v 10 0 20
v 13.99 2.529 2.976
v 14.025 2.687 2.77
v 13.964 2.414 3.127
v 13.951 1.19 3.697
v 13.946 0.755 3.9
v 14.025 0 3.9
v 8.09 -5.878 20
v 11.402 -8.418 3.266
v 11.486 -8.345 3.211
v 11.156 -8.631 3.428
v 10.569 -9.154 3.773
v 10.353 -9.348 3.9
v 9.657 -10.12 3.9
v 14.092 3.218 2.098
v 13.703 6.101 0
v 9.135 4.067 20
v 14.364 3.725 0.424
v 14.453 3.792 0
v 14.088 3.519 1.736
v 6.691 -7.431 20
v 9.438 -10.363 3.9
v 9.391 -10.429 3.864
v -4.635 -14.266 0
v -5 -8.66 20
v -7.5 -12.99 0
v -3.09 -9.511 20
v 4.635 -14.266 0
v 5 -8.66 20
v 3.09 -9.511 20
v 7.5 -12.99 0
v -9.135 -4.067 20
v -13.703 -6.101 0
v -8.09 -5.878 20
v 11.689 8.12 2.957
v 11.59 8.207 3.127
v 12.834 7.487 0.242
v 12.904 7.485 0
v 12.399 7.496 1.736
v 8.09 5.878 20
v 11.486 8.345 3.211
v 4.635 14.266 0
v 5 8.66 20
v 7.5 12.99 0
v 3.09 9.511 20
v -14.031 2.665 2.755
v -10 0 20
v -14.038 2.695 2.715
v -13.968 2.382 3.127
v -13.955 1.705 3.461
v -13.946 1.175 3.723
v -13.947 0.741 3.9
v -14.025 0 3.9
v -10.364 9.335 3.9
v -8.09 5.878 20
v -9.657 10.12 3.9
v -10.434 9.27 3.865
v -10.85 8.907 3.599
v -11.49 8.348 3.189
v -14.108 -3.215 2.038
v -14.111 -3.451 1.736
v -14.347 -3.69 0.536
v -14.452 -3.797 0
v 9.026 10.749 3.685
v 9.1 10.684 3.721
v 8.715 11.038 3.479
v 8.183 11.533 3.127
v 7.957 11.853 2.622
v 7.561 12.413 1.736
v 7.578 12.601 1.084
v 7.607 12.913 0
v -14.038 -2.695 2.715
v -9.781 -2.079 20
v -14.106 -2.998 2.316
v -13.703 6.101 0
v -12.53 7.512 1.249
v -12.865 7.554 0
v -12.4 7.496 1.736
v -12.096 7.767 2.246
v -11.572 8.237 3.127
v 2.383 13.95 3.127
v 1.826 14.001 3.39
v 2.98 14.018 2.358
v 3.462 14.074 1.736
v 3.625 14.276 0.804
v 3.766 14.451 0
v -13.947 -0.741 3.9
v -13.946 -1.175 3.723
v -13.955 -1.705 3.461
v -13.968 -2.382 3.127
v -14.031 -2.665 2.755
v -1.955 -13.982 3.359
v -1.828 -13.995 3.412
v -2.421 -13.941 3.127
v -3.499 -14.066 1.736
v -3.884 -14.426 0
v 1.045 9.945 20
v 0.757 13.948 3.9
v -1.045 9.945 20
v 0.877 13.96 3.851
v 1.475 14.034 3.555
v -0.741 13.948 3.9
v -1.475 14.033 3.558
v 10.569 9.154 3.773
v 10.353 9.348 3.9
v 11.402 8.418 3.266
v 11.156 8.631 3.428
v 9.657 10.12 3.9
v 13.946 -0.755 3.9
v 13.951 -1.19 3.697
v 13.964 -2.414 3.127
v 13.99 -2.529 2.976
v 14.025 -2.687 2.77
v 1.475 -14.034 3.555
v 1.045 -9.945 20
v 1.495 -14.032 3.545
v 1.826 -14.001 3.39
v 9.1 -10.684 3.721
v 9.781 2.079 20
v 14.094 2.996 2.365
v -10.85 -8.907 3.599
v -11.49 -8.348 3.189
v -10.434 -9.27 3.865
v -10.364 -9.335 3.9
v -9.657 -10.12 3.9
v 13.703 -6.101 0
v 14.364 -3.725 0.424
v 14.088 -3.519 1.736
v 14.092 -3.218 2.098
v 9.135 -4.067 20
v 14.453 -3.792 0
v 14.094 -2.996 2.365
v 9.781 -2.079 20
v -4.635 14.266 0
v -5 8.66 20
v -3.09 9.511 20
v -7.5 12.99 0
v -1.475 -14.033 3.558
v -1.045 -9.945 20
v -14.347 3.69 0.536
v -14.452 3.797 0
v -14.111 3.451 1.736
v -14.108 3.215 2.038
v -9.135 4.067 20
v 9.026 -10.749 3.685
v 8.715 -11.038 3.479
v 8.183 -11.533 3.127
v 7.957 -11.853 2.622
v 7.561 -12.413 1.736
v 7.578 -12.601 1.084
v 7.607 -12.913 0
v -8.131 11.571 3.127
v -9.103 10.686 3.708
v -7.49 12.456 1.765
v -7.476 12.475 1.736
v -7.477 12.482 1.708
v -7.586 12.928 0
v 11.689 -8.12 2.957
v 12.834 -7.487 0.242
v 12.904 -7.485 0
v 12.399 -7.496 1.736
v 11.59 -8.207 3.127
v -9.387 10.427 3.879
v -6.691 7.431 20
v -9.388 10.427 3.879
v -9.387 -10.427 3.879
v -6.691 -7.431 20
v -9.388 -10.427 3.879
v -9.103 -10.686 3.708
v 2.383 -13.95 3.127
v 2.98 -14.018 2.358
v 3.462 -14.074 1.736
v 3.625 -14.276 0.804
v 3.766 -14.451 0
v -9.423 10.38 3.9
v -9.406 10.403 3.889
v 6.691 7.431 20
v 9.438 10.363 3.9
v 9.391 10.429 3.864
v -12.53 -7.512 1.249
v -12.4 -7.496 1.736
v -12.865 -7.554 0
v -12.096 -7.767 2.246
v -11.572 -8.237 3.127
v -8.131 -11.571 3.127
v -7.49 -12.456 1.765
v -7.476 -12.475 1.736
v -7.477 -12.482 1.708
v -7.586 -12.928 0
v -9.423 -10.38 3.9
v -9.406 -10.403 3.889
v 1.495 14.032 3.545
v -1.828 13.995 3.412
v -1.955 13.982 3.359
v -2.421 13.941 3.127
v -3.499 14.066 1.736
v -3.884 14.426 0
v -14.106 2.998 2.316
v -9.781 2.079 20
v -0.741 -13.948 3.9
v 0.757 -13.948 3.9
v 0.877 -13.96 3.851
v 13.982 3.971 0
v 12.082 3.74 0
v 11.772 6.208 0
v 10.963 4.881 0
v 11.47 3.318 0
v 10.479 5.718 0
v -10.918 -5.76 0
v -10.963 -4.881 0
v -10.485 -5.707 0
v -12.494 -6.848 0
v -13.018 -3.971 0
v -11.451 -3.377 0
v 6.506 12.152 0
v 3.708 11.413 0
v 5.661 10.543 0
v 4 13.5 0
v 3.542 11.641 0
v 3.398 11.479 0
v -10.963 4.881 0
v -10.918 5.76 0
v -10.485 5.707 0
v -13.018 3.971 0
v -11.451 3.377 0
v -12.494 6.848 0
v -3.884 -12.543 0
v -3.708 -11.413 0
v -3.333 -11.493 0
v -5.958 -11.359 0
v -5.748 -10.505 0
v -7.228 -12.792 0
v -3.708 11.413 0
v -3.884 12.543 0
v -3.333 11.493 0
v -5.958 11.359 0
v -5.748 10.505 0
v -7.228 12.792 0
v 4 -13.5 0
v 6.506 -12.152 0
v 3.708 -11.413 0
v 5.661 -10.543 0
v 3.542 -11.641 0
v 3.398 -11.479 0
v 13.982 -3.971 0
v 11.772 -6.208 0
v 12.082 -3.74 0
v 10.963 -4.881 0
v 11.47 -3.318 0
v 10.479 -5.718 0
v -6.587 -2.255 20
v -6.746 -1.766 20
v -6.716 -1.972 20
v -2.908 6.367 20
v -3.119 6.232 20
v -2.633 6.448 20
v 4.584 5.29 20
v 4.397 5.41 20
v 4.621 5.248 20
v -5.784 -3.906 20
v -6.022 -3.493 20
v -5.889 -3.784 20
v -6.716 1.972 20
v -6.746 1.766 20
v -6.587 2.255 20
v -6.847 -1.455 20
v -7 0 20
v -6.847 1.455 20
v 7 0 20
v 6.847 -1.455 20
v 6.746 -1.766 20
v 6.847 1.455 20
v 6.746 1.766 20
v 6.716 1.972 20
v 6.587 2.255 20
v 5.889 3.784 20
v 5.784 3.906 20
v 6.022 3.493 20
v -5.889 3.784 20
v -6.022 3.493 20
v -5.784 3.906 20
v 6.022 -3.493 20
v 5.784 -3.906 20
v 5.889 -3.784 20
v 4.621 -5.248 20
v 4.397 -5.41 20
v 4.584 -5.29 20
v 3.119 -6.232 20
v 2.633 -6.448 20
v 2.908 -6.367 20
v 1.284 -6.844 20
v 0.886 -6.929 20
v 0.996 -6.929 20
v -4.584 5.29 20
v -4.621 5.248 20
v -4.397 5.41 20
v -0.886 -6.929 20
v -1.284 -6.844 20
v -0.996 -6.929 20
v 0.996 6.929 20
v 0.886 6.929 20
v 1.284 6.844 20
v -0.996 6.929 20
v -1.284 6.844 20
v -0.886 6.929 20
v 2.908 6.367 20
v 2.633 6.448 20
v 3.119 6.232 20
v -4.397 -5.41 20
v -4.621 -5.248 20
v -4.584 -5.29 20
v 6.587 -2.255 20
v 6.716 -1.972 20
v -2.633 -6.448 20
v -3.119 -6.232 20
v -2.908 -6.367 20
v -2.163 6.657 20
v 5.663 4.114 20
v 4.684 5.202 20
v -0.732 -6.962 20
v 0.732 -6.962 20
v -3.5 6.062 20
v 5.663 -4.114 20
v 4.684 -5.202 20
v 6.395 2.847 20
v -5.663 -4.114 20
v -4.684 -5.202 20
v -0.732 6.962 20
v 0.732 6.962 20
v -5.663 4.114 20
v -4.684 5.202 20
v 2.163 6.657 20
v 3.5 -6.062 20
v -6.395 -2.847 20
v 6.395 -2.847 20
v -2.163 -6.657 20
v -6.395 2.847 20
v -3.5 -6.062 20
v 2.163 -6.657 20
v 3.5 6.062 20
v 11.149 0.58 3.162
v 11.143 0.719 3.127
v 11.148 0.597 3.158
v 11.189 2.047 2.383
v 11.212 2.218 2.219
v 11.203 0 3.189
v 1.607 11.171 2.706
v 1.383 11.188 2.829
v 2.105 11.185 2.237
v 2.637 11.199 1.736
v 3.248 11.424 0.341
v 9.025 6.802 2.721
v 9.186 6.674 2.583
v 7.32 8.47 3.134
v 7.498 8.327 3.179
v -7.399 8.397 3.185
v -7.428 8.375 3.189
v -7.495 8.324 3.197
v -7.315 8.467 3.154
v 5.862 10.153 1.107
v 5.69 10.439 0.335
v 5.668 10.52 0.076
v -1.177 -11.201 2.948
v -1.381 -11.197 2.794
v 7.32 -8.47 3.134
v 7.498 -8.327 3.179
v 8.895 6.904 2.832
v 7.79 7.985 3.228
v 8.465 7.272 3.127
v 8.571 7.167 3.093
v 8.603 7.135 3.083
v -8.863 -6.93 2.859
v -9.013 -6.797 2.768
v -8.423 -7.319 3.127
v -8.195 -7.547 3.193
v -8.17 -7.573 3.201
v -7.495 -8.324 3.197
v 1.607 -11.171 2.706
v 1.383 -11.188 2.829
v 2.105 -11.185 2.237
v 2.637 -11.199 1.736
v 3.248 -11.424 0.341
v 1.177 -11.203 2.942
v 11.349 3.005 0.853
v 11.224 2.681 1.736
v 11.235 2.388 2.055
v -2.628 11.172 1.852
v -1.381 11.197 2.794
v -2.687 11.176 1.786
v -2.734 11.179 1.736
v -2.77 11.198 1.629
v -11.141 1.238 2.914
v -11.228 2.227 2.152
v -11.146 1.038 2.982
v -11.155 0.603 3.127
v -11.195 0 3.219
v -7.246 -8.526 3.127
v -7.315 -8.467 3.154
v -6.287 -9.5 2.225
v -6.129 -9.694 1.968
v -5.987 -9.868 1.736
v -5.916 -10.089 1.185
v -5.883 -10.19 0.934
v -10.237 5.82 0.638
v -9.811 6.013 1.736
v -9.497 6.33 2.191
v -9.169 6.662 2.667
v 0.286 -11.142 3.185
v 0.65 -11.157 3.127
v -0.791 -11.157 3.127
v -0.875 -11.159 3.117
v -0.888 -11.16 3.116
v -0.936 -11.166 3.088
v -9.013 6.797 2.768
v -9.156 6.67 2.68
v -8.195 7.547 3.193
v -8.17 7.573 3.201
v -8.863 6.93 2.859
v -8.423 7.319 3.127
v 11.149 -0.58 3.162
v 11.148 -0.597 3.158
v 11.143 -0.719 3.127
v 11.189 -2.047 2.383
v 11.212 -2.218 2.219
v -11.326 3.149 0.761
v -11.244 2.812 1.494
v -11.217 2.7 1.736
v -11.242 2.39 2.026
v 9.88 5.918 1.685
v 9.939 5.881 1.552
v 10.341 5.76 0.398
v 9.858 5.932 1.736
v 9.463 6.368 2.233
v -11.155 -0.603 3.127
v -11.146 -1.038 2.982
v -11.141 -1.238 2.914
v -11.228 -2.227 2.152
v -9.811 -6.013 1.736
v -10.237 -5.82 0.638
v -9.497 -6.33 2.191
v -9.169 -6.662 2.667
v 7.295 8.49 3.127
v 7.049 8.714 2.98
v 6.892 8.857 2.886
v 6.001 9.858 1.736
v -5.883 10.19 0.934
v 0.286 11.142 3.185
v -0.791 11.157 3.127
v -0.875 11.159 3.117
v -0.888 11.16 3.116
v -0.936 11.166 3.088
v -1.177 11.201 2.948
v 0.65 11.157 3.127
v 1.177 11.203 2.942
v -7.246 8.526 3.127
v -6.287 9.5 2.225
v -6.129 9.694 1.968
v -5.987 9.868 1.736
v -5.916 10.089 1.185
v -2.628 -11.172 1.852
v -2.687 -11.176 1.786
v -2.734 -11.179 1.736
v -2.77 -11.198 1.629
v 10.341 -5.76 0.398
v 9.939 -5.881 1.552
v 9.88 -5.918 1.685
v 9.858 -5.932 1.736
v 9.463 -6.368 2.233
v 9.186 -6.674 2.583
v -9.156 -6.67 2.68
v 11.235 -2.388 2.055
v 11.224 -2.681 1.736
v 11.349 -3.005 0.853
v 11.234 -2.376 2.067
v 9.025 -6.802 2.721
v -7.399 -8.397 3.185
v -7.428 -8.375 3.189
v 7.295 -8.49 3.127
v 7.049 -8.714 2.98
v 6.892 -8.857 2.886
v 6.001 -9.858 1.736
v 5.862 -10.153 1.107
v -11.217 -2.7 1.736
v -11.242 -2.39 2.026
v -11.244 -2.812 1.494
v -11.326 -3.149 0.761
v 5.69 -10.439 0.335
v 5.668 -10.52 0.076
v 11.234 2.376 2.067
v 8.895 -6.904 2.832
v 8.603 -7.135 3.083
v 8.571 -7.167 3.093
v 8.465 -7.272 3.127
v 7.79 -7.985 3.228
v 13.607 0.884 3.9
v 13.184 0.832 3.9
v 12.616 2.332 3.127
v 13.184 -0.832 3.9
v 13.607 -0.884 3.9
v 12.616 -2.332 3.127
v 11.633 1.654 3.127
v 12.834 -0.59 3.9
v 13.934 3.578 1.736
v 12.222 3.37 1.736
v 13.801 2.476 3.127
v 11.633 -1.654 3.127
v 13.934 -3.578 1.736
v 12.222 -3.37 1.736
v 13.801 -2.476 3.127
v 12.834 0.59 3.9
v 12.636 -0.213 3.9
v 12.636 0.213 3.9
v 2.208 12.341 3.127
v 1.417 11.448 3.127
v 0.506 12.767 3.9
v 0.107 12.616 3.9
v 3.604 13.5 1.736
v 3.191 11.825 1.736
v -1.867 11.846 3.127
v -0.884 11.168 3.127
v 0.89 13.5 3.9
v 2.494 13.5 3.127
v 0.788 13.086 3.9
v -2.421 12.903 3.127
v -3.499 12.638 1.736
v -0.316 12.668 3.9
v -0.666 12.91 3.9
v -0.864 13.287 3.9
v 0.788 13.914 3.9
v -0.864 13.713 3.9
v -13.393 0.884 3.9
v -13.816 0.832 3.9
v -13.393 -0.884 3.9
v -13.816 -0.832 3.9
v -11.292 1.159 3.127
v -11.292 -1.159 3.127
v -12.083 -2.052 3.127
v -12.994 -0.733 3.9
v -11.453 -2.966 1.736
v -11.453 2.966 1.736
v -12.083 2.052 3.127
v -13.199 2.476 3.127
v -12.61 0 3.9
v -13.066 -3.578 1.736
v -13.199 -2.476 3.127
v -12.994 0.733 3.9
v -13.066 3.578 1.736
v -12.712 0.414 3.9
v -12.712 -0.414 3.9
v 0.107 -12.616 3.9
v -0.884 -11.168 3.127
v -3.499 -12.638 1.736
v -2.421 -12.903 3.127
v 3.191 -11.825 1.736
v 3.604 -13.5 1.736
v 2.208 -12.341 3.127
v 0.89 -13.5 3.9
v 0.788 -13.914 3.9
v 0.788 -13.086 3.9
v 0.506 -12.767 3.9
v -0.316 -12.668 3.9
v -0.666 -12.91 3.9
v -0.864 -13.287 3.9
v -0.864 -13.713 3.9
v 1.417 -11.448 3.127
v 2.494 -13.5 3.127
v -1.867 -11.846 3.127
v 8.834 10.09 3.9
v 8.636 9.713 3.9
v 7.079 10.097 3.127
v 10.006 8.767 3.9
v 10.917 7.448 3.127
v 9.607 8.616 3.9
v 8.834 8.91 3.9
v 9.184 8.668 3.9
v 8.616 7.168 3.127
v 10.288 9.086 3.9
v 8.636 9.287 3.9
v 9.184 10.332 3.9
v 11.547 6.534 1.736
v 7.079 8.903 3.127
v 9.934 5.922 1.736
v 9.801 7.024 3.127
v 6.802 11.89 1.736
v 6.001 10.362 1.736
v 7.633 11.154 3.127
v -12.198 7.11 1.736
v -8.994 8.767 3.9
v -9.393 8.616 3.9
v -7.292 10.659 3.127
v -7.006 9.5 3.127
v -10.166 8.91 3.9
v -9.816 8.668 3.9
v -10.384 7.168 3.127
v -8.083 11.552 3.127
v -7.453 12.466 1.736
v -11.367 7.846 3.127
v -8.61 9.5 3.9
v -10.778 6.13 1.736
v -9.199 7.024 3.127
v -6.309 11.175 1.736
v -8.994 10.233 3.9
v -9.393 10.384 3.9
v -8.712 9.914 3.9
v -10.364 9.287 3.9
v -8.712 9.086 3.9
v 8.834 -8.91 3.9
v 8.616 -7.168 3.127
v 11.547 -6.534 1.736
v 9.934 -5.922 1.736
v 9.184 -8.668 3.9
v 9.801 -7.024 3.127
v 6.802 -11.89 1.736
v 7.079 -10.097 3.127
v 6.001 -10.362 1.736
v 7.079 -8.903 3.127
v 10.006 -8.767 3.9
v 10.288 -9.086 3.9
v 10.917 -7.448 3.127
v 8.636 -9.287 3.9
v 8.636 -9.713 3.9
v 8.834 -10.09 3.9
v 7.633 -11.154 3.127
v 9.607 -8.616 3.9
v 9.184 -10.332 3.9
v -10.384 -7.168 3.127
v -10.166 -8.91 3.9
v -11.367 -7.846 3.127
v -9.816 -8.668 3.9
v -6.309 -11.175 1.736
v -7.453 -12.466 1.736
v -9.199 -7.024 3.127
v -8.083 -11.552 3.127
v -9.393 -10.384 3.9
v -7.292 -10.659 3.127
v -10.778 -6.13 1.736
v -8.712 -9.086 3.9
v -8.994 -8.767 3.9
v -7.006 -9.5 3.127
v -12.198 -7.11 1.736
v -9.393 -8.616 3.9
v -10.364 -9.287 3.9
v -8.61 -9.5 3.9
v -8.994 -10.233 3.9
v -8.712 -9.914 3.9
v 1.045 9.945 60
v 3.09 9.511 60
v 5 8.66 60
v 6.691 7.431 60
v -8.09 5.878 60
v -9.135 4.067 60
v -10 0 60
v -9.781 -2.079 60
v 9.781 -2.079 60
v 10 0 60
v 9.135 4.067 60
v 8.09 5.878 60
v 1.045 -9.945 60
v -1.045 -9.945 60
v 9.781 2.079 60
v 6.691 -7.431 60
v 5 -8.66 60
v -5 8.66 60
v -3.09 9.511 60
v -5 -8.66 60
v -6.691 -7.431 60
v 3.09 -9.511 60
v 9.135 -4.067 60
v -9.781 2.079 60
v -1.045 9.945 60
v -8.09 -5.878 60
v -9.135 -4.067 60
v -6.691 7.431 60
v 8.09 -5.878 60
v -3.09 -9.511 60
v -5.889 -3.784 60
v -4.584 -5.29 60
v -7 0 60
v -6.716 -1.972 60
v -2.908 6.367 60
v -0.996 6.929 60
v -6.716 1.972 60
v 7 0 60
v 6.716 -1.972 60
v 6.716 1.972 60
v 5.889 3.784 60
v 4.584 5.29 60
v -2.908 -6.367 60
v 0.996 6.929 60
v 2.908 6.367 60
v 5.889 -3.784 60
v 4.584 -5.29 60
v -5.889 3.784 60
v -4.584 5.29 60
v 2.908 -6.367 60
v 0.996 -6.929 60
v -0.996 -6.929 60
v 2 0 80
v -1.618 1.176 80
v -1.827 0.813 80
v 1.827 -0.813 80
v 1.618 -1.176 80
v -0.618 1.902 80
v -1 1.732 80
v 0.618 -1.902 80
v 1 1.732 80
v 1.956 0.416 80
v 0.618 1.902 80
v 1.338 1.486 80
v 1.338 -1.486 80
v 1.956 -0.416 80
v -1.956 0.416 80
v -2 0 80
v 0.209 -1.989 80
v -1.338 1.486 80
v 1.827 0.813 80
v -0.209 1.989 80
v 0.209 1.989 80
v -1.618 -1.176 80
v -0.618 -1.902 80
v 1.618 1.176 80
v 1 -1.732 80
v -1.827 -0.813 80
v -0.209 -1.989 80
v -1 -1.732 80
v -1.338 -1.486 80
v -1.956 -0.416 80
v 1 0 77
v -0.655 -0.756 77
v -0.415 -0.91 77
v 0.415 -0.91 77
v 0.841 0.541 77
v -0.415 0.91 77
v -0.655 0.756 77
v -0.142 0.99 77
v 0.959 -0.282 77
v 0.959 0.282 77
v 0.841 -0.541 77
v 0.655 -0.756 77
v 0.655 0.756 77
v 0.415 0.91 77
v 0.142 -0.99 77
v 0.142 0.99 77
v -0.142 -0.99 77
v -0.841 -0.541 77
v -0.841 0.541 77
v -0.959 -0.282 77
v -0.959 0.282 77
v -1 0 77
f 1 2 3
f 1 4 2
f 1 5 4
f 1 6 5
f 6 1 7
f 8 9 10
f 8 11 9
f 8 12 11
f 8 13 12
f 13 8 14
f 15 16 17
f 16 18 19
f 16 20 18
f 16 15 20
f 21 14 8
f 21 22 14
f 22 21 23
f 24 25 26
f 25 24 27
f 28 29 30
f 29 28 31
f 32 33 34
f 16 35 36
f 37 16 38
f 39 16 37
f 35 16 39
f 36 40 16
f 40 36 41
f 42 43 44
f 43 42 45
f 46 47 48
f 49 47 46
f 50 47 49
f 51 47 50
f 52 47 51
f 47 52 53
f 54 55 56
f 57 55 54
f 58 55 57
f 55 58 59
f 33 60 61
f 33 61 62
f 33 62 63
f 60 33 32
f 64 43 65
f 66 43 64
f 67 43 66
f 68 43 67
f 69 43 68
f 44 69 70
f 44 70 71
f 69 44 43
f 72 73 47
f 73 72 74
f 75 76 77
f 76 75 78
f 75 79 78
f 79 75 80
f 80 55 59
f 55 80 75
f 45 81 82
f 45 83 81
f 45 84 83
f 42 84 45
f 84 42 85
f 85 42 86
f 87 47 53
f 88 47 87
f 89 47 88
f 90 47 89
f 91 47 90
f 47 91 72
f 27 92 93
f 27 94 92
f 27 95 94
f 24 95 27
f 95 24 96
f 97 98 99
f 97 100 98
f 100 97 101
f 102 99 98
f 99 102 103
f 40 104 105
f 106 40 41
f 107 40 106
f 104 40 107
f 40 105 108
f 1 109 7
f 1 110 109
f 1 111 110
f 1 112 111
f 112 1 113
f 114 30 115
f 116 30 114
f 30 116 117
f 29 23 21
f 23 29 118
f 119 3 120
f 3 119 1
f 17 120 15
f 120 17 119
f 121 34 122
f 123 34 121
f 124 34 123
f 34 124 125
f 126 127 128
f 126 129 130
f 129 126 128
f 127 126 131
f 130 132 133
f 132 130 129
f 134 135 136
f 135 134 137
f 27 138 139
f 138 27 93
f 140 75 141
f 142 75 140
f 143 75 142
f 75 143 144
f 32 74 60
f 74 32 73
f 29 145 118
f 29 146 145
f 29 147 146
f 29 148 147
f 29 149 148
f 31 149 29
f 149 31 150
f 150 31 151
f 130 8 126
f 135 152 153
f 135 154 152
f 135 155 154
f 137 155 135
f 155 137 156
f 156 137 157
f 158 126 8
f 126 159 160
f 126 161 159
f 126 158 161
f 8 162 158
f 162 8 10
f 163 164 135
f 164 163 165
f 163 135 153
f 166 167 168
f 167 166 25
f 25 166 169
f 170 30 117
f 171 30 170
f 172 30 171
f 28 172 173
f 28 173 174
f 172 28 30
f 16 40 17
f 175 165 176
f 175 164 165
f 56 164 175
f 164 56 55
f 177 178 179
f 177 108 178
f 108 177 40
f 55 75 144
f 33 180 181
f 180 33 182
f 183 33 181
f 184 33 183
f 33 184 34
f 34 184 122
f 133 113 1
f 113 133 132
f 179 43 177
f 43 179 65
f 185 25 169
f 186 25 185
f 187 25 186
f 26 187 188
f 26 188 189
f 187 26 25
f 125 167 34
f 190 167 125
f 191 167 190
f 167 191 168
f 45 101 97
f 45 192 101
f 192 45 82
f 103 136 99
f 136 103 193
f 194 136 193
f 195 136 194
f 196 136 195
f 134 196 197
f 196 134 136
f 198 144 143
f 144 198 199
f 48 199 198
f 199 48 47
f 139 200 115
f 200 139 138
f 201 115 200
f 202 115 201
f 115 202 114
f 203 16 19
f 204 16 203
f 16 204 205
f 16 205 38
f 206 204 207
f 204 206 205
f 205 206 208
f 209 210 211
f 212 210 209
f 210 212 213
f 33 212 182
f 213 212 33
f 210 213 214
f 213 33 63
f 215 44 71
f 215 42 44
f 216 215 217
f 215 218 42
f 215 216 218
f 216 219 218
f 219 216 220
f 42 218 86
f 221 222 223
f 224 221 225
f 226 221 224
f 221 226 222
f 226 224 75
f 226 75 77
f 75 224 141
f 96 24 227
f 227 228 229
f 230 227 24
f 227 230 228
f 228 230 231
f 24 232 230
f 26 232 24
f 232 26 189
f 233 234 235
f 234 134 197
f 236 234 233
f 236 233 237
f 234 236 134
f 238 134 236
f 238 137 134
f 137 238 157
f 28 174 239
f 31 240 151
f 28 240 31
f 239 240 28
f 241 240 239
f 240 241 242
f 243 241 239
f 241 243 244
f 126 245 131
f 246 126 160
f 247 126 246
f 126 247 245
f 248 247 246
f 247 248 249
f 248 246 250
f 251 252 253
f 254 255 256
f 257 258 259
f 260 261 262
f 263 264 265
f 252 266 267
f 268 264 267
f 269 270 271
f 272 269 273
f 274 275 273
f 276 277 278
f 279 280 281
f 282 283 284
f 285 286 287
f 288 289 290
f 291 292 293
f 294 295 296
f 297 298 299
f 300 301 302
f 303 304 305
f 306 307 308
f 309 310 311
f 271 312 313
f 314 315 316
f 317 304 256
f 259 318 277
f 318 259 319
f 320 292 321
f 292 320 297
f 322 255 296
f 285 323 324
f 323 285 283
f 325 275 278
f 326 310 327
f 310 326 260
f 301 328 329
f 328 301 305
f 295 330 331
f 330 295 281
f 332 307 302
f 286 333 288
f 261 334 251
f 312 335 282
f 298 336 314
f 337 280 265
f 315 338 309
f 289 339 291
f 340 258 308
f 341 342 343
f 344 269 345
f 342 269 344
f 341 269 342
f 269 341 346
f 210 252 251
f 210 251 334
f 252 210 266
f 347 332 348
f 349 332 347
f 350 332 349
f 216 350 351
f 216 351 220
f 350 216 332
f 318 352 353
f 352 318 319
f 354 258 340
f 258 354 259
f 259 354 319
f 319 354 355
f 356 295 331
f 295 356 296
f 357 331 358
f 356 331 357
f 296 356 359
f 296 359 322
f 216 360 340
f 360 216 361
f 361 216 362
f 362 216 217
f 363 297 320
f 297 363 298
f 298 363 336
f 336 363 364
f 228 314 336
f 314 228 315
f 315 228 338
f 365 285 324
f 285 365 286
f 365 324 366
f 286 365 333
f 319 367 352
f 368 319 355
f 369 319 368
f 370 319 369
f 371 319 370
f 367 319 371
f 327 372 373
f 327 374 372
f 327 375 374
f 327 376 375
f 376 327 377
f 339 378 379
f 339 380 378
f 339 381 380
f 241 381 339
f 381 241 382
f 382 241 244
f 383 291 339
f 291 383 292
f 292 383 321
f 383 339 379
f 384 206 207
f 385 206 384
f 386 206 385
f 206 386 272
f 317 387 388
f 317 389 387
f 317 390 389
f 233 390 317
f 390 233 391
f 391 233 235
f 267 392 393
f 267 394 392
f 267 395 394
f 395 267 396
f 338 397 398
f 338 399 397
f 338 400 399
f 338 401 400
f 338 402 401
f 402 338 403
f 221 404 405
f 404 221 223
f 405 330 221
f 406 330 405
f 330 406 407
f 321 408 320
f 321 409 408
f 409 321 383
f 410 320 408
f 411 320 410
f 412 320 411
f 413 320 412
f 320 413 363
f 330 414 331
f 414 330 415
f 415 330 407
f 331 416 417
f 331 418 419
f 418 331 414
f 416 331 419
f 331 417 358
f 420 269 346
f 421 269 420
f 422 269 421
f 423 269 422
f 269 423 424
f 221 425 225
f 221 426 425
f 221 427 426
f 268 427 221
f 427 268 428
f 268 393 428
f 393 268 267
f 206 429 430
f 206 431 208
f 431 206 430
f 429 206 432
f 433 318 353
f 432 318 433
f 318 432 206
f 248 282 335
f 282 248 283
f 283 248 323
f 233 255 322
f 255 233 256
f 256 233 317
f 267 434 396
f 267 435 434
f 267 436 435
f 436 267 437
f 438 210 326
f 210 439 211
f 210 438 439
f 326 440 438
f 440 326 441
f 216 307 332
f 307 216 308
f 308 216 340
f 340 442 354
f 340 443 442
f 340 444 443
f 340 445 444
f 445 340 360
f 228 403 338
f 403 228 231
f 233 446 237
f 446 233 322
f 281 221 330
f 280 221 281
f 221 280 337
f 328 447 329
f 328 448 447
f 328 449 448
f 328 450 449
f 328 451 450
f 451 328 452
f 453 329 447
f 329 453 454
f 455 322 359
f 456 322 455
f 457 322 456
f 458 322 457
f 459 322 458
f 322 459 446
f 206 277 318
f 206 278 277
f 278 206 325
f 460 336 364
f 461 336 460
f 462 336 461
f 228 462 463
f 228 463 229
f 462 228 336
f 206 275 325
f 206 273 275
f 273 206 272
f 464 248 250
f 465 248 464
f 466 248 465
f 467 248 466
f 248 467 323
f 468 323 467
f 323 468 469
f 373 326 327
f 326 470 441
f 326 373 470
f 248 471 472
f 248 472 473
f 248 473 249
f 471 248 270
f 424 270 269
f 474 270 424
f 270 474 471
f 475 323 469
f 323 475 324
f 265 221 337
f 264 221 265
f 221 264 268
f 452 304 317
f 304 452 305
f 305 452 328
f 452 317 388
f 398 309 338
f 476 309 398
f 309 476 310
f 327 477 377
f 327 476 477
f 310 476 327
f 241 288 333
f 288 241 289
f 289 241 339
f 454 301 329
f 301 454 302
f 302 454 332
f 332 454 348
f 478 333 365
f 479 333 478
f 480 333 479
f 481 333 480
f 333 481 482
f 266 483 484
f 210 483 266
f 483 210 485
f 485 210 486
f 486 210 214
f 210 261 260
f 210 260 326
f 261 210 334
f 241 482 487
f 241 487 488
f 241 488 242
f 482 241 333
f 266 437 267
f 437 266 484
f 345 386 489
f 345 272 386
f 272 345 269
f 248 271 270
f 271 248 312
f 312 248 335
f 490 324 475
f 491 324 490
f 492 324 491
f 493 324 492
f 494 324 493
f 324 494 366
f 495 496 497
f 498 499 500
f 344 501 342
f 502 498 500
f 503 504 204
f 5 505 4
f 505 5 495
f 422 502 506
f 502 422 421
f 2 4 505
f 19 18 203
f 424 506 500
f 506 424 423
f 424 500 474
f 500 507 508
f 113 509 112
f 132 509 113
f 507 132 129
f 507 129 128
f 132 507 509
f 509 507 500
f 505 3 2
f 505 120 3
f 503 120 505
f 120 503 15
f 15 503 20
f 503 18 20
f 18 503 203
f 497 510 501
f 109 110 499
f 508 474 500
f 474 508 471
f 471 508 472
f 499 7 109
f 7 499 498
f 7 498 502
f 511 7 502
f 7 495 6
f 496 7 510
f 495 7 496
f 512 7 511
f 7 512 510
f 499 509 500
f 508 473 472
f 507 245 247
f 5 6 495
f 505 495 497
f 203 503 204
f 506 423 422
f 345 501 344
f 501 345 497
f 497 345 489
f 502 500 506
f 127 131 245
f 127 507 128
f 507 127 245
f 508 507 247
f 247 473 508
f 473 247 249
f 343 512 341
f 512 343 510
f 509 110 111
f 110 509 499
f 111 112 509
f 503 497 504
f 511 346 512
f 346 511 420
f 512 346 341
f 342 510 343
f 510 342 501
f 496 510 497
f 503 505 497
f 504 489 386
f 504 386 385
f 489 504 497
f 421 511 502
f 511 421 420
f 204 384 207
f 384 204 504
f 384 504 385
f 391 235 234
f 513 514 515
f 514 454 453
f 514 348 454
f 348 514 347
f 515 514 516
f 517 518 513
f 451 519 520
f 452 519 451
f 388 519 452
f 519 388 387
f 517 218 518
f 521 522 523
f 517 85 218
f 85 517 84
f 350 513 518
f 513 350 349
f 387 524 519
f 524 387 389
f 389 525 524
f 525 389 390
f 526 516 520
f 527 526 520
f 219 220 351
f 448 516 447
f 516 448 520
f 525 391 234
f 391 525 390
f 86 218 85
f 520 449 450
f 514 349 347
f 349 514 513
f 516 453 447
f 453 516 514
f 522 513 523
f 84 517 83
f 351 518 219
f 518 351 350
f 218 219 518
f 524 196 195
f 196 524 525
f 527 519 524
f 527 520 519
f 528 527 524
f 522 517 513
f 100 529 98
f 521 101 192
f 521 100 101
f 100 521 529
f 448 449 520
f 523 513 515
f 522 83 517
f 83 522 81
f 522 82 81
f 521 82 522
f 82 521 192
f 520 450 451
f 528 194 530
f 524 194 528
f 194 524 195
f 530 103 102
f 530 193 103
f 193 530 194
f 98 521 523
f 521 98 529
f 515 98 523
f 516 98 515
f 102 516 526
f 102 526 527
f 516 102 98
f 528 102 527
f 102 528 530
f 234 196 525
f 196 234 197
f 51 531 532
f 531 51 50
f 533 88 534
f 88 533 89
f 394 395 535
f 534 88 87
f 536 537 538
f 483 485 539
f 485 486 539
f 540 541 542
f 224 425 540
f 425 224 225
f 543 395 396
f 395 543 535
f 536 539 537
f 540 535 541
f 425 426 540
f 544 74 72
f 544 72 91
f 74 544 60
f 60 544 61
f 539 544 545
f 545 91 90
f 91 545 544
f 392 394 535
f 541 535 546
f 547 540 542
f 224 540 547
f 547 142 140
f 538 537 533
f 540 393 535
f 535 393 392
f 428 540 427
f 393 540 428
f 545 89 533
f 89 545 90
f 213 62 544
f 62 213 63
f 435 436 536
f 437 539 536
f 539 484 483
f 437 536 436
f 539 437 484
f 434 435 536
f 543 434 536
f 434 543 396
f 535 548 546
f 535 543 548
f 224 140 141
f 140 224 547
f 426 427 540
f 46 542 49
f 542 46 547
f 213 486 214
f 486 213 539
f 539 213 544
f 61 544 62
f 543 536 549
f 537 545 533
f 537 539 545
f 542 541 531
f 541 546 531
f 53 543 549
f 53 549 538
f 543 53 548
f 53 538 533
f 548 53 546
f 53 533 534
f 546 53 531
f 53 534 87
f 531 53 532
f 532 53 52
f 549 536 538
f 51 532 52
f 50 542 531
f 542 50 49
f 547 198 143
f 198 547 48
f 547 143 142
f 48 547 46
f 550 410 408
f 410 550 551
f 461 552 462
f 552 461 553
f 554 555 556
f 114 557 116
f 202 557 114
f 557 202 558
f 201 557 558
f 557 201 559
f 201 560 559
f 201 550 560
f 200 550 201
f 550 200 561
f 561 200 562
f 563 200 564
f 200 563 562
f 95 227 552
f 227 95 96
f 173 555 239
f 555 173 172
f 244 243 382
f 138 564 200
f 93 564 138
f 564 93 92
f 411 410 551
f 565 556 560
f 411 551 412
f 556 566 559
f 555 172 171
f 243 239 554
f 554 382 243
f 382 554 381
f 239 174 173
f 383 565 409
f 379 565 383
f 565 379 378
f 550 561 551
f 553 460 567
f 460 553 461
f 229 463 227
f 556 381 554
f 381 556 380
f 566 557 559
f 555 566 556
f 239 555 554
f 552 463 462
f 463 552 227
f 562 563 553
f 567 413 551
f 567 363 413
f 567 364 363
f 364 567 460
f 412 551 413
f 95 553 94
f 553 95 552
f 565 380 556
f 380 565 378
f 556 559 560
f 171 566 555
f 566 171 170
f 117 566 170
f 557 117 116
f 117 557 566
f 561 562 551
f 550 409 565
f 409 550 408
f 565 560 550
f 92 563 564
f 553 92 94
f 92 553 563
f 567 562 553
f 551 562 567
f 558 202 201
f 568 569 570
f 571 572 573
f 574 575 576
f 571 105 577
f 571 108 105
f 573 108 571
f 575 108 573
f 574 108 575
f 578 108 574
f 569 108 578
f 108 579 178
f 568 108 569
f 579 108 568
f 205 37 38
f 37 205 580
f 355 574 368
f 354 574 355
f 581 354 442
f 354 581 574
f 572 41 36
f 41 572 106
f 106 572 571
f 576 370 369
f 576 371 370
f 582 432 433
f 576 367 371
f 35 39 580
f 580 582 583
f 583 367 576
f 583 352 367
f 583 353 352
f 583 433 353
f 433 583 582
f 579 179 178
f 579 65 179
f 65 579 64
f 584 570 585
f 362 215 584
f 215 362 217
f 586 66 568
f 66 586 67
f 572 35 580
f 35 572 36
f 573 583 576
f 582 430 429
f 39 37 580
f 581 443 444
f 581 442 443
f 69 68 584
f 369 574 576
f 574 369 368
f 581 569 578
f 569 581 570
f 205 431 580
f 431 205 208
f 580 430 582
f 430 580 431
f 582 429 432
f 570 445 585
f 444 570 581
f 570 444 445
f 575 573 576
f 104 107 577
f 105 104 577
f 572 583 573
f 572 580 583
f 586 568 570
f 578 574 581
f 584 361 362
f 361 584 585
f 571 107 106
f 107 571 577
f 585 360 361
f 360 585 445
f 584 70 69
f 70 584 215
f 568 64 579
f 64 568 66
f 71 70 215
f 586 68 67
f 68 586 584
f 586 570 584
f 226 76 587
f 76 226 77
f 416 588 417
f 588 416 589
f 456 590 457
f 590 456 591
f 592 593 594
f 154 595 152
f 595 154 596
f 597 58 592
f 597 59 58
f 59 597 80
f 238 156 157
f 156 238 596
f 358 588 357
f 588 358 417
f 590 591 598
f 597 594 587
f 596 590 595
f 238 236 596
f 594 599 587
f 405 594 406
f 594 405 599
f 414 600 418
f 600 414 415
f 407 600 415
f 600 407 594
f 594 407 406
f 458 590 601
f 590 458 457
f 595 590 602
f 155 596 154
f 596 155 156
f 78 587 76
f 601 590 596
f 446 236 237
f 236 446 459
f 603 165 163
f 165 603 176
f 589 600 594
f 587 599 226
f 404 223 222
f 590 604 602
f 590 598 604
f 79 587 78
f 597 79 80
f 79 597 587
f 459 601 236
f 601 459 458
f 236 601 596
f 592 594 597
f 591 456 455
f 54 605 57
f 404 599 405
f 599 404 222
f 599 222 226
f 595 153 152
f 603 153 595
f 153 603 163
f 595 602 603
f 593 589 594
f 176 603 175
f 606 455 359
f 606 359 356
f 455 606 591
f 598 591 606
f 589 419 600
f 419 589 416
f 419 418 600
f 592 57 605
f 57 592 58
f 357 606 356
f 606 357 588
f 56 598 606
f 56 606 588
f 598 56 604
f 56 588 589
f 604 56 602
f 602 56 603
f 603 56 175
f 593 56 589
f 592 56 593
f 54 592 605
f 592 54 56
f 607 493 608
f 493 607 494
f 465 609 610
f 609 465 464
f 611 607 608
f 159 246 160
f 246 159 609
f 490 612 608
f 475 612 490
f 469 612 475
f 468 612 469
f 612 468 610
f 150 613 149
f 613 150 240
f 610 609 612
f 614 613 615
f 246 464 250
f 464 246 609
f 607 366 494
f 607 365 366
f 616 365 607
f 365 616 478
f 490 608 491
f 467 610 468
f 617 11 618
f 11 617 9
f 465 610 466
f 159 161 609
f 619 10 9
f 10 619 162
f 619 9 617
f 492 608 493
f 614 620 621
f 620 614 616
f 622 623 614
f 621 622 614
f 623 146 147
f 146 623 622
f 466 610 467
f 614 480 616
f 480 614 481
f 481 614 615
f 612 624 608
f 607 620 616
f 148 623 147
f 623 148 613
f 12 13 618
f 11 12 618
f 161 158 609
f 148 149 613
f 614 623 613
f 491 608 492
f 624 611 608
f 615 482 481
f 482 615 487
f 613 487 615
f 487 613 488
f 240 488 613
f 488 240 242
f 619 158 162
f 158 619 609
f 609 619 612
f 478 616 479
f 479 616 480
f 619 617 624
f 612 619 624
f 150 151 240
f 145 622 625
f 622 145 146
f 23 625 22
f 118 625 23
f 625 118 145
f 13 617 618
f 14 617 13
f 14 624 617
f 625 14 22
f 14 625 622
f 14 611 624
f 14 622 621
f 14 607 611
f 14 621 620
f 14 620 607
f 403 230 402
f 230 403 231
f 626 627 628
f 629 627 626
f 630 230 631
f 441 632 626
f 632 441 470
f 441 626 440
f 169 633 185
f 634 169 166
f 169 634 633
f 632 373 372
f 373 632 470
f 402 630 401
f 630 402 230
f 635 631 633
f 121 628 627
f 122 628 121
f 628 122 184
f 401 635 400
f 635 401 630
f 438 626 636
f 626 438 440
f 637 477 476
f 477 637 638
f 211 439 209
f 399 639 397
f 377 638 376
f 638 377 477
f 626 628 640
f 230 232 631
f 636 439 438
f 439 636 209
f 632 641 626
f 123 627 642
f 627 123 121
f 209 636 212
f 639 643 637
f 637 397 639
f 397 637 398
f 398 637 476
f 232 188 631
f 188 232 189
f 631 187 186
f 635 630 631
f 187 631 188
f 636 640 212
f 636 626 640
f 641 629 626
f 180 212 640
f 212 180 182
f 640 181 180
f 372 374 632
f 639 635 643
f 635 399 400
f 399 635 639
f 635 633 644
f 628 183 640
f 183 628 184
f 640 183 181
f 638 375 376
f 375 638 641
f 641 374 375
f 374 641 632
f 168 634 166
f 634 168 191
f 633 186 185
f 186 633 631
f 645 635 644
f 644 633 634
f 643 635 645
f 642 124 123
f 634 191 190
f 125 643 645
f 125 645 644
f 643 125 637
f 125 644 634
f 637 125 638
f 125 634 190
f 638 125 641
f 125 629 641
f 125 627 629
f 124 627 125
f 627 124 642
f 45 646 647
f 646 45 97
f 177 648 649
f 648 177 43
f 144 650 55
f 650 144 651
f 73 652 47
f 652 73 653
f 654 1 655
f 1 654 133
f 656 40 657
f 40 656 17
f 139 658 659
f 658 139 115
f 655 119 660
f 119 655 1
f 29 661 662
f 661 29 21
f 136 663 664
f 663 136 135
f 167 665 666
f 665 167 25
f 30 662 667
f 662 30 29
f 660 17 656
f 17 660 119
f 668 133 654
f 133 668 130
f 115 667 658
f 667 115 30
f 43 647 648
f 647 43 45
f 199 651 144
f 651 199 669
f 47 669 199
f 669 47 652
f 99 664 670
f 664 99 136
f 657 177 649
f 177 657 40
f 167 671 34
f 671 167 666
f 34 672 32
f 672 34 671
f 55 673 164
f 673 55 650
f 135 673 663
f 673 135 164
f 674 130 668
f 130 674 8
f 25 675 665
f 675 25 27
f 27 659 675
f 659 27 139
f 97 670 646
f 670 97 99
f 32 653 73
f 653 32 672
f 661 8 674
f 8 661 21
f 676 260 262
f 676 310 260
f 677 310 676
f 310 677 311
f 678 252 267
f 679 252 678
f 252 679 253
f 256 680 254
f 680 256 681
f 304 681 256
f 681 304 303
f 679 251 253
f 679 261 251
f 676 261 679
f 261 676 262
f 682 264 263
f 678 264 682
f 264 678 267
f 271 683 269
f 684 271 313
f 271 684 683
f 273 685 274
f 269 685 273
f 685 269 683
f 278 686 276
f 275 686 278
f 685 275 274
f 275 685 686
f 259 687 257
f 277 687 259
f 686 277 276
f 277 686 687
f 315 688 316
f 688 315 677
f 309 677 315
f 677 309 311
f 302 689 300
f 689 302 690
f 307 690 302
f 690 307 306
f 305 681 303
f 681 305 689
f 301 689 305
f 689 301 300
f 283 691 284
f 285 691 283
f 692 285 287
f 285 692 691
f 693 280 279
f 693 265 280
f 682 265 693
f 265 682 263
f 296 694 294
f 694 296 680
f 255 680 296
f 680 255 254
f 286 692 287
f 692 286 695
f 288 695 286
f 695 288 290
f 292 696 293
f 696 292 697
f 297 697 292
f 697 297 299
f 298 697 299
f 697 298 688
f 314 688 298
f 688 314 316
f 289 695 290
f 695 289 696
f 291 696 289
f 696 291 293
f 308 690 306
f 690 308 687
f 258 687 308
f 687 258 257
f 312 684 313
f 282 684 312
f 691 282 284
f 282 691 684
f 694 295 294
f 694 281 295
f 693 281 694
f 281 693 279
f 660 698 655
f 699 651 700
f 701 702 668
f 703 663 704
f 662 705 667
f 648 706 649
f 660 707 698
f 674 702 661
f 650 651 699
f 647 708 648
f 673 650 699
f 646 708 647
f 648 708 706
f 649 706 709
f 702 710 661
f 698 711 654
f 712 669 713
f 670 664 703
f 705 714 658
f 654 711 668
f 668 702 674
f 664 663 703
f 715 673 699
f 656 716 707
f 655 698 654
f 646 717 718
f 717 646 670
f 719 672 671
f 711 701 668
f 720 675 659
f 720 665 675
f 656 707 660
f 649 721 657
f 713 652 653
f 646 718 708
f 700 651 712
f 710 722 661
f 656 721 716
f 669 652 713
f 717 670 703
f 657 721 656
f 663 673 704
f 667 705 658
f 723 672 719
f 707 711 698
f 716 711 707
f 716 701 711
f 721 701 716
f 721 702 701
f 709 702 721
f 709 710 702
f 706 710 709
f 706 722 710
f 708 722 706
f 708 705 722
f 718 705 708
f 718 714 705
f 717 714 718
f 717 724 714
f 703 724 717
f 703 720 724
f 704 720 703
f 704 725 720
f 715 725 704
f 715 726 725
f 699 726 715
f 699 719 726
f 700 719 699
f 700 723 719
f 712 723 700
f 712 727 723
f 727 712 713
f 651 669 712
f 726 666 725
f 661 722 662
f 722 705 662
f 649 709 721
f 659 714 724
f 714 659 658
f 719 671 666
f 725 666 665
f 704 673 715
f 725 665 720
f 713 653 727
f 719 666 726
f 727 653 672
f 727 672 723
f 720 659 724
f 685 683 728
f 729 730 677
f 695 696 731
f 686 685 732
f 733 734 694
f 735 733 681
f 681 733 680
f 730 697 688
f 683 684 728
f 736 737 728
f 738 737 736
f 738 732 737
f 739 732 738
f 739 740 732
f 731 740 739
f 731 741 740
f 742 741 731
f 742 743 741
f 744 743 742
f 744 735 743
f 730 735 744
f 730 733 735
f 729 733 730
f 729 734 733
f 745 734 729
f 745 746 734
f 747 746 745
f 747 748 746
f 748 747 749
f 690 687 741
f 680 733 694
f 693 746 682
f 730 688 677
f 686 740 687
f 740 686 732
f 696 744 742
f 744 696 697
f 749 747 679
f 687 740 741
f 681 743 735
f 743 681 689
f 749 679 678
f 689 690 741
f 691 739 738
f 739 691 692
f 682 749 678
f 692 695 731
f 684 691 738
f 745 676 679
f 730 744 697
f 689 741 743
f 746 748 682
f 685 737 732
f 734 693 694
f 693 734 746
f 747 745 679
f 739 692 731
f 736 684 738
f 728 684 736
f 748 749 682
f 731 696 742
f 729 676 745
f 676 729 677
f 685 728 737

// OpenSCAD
module Base() {
  difference() {
    cylinder(h=20, r1=15, r2=10);
    cylinder(h=20, r1=12, r2=7);
    translate([13.5,0,0]) sphere(r=4);
    translate([0, 13.5,0]) sphere(r=4);
    translate([-13.5,0,0]) sphere(r=4);
    translate([0, -13.5,0]) sphere(r=4);
    translate([9.5, 9.5,0]) sphere(r=4);
    translate([-9.5, 9.5,0]) sphere(r=4);
    translate([9.5, -9.5,0]) sphere(r=4);
    translate([-9.5, -9.5,0]) sphere(r=4);
  }
}

module Tube() {
  difference() {
    cylinder(h=40, r=10);
    cylinder(h=40, r=7);
  }
}

module Cap() {
  difference() {
    cylinder(h=20, r1=10, r2=2);
    cylinder(h=17, r1=7, r2=1);
  }
}

Base();
translate([0,0,20]) Tube();
translate([0,0,60]) Cap();
